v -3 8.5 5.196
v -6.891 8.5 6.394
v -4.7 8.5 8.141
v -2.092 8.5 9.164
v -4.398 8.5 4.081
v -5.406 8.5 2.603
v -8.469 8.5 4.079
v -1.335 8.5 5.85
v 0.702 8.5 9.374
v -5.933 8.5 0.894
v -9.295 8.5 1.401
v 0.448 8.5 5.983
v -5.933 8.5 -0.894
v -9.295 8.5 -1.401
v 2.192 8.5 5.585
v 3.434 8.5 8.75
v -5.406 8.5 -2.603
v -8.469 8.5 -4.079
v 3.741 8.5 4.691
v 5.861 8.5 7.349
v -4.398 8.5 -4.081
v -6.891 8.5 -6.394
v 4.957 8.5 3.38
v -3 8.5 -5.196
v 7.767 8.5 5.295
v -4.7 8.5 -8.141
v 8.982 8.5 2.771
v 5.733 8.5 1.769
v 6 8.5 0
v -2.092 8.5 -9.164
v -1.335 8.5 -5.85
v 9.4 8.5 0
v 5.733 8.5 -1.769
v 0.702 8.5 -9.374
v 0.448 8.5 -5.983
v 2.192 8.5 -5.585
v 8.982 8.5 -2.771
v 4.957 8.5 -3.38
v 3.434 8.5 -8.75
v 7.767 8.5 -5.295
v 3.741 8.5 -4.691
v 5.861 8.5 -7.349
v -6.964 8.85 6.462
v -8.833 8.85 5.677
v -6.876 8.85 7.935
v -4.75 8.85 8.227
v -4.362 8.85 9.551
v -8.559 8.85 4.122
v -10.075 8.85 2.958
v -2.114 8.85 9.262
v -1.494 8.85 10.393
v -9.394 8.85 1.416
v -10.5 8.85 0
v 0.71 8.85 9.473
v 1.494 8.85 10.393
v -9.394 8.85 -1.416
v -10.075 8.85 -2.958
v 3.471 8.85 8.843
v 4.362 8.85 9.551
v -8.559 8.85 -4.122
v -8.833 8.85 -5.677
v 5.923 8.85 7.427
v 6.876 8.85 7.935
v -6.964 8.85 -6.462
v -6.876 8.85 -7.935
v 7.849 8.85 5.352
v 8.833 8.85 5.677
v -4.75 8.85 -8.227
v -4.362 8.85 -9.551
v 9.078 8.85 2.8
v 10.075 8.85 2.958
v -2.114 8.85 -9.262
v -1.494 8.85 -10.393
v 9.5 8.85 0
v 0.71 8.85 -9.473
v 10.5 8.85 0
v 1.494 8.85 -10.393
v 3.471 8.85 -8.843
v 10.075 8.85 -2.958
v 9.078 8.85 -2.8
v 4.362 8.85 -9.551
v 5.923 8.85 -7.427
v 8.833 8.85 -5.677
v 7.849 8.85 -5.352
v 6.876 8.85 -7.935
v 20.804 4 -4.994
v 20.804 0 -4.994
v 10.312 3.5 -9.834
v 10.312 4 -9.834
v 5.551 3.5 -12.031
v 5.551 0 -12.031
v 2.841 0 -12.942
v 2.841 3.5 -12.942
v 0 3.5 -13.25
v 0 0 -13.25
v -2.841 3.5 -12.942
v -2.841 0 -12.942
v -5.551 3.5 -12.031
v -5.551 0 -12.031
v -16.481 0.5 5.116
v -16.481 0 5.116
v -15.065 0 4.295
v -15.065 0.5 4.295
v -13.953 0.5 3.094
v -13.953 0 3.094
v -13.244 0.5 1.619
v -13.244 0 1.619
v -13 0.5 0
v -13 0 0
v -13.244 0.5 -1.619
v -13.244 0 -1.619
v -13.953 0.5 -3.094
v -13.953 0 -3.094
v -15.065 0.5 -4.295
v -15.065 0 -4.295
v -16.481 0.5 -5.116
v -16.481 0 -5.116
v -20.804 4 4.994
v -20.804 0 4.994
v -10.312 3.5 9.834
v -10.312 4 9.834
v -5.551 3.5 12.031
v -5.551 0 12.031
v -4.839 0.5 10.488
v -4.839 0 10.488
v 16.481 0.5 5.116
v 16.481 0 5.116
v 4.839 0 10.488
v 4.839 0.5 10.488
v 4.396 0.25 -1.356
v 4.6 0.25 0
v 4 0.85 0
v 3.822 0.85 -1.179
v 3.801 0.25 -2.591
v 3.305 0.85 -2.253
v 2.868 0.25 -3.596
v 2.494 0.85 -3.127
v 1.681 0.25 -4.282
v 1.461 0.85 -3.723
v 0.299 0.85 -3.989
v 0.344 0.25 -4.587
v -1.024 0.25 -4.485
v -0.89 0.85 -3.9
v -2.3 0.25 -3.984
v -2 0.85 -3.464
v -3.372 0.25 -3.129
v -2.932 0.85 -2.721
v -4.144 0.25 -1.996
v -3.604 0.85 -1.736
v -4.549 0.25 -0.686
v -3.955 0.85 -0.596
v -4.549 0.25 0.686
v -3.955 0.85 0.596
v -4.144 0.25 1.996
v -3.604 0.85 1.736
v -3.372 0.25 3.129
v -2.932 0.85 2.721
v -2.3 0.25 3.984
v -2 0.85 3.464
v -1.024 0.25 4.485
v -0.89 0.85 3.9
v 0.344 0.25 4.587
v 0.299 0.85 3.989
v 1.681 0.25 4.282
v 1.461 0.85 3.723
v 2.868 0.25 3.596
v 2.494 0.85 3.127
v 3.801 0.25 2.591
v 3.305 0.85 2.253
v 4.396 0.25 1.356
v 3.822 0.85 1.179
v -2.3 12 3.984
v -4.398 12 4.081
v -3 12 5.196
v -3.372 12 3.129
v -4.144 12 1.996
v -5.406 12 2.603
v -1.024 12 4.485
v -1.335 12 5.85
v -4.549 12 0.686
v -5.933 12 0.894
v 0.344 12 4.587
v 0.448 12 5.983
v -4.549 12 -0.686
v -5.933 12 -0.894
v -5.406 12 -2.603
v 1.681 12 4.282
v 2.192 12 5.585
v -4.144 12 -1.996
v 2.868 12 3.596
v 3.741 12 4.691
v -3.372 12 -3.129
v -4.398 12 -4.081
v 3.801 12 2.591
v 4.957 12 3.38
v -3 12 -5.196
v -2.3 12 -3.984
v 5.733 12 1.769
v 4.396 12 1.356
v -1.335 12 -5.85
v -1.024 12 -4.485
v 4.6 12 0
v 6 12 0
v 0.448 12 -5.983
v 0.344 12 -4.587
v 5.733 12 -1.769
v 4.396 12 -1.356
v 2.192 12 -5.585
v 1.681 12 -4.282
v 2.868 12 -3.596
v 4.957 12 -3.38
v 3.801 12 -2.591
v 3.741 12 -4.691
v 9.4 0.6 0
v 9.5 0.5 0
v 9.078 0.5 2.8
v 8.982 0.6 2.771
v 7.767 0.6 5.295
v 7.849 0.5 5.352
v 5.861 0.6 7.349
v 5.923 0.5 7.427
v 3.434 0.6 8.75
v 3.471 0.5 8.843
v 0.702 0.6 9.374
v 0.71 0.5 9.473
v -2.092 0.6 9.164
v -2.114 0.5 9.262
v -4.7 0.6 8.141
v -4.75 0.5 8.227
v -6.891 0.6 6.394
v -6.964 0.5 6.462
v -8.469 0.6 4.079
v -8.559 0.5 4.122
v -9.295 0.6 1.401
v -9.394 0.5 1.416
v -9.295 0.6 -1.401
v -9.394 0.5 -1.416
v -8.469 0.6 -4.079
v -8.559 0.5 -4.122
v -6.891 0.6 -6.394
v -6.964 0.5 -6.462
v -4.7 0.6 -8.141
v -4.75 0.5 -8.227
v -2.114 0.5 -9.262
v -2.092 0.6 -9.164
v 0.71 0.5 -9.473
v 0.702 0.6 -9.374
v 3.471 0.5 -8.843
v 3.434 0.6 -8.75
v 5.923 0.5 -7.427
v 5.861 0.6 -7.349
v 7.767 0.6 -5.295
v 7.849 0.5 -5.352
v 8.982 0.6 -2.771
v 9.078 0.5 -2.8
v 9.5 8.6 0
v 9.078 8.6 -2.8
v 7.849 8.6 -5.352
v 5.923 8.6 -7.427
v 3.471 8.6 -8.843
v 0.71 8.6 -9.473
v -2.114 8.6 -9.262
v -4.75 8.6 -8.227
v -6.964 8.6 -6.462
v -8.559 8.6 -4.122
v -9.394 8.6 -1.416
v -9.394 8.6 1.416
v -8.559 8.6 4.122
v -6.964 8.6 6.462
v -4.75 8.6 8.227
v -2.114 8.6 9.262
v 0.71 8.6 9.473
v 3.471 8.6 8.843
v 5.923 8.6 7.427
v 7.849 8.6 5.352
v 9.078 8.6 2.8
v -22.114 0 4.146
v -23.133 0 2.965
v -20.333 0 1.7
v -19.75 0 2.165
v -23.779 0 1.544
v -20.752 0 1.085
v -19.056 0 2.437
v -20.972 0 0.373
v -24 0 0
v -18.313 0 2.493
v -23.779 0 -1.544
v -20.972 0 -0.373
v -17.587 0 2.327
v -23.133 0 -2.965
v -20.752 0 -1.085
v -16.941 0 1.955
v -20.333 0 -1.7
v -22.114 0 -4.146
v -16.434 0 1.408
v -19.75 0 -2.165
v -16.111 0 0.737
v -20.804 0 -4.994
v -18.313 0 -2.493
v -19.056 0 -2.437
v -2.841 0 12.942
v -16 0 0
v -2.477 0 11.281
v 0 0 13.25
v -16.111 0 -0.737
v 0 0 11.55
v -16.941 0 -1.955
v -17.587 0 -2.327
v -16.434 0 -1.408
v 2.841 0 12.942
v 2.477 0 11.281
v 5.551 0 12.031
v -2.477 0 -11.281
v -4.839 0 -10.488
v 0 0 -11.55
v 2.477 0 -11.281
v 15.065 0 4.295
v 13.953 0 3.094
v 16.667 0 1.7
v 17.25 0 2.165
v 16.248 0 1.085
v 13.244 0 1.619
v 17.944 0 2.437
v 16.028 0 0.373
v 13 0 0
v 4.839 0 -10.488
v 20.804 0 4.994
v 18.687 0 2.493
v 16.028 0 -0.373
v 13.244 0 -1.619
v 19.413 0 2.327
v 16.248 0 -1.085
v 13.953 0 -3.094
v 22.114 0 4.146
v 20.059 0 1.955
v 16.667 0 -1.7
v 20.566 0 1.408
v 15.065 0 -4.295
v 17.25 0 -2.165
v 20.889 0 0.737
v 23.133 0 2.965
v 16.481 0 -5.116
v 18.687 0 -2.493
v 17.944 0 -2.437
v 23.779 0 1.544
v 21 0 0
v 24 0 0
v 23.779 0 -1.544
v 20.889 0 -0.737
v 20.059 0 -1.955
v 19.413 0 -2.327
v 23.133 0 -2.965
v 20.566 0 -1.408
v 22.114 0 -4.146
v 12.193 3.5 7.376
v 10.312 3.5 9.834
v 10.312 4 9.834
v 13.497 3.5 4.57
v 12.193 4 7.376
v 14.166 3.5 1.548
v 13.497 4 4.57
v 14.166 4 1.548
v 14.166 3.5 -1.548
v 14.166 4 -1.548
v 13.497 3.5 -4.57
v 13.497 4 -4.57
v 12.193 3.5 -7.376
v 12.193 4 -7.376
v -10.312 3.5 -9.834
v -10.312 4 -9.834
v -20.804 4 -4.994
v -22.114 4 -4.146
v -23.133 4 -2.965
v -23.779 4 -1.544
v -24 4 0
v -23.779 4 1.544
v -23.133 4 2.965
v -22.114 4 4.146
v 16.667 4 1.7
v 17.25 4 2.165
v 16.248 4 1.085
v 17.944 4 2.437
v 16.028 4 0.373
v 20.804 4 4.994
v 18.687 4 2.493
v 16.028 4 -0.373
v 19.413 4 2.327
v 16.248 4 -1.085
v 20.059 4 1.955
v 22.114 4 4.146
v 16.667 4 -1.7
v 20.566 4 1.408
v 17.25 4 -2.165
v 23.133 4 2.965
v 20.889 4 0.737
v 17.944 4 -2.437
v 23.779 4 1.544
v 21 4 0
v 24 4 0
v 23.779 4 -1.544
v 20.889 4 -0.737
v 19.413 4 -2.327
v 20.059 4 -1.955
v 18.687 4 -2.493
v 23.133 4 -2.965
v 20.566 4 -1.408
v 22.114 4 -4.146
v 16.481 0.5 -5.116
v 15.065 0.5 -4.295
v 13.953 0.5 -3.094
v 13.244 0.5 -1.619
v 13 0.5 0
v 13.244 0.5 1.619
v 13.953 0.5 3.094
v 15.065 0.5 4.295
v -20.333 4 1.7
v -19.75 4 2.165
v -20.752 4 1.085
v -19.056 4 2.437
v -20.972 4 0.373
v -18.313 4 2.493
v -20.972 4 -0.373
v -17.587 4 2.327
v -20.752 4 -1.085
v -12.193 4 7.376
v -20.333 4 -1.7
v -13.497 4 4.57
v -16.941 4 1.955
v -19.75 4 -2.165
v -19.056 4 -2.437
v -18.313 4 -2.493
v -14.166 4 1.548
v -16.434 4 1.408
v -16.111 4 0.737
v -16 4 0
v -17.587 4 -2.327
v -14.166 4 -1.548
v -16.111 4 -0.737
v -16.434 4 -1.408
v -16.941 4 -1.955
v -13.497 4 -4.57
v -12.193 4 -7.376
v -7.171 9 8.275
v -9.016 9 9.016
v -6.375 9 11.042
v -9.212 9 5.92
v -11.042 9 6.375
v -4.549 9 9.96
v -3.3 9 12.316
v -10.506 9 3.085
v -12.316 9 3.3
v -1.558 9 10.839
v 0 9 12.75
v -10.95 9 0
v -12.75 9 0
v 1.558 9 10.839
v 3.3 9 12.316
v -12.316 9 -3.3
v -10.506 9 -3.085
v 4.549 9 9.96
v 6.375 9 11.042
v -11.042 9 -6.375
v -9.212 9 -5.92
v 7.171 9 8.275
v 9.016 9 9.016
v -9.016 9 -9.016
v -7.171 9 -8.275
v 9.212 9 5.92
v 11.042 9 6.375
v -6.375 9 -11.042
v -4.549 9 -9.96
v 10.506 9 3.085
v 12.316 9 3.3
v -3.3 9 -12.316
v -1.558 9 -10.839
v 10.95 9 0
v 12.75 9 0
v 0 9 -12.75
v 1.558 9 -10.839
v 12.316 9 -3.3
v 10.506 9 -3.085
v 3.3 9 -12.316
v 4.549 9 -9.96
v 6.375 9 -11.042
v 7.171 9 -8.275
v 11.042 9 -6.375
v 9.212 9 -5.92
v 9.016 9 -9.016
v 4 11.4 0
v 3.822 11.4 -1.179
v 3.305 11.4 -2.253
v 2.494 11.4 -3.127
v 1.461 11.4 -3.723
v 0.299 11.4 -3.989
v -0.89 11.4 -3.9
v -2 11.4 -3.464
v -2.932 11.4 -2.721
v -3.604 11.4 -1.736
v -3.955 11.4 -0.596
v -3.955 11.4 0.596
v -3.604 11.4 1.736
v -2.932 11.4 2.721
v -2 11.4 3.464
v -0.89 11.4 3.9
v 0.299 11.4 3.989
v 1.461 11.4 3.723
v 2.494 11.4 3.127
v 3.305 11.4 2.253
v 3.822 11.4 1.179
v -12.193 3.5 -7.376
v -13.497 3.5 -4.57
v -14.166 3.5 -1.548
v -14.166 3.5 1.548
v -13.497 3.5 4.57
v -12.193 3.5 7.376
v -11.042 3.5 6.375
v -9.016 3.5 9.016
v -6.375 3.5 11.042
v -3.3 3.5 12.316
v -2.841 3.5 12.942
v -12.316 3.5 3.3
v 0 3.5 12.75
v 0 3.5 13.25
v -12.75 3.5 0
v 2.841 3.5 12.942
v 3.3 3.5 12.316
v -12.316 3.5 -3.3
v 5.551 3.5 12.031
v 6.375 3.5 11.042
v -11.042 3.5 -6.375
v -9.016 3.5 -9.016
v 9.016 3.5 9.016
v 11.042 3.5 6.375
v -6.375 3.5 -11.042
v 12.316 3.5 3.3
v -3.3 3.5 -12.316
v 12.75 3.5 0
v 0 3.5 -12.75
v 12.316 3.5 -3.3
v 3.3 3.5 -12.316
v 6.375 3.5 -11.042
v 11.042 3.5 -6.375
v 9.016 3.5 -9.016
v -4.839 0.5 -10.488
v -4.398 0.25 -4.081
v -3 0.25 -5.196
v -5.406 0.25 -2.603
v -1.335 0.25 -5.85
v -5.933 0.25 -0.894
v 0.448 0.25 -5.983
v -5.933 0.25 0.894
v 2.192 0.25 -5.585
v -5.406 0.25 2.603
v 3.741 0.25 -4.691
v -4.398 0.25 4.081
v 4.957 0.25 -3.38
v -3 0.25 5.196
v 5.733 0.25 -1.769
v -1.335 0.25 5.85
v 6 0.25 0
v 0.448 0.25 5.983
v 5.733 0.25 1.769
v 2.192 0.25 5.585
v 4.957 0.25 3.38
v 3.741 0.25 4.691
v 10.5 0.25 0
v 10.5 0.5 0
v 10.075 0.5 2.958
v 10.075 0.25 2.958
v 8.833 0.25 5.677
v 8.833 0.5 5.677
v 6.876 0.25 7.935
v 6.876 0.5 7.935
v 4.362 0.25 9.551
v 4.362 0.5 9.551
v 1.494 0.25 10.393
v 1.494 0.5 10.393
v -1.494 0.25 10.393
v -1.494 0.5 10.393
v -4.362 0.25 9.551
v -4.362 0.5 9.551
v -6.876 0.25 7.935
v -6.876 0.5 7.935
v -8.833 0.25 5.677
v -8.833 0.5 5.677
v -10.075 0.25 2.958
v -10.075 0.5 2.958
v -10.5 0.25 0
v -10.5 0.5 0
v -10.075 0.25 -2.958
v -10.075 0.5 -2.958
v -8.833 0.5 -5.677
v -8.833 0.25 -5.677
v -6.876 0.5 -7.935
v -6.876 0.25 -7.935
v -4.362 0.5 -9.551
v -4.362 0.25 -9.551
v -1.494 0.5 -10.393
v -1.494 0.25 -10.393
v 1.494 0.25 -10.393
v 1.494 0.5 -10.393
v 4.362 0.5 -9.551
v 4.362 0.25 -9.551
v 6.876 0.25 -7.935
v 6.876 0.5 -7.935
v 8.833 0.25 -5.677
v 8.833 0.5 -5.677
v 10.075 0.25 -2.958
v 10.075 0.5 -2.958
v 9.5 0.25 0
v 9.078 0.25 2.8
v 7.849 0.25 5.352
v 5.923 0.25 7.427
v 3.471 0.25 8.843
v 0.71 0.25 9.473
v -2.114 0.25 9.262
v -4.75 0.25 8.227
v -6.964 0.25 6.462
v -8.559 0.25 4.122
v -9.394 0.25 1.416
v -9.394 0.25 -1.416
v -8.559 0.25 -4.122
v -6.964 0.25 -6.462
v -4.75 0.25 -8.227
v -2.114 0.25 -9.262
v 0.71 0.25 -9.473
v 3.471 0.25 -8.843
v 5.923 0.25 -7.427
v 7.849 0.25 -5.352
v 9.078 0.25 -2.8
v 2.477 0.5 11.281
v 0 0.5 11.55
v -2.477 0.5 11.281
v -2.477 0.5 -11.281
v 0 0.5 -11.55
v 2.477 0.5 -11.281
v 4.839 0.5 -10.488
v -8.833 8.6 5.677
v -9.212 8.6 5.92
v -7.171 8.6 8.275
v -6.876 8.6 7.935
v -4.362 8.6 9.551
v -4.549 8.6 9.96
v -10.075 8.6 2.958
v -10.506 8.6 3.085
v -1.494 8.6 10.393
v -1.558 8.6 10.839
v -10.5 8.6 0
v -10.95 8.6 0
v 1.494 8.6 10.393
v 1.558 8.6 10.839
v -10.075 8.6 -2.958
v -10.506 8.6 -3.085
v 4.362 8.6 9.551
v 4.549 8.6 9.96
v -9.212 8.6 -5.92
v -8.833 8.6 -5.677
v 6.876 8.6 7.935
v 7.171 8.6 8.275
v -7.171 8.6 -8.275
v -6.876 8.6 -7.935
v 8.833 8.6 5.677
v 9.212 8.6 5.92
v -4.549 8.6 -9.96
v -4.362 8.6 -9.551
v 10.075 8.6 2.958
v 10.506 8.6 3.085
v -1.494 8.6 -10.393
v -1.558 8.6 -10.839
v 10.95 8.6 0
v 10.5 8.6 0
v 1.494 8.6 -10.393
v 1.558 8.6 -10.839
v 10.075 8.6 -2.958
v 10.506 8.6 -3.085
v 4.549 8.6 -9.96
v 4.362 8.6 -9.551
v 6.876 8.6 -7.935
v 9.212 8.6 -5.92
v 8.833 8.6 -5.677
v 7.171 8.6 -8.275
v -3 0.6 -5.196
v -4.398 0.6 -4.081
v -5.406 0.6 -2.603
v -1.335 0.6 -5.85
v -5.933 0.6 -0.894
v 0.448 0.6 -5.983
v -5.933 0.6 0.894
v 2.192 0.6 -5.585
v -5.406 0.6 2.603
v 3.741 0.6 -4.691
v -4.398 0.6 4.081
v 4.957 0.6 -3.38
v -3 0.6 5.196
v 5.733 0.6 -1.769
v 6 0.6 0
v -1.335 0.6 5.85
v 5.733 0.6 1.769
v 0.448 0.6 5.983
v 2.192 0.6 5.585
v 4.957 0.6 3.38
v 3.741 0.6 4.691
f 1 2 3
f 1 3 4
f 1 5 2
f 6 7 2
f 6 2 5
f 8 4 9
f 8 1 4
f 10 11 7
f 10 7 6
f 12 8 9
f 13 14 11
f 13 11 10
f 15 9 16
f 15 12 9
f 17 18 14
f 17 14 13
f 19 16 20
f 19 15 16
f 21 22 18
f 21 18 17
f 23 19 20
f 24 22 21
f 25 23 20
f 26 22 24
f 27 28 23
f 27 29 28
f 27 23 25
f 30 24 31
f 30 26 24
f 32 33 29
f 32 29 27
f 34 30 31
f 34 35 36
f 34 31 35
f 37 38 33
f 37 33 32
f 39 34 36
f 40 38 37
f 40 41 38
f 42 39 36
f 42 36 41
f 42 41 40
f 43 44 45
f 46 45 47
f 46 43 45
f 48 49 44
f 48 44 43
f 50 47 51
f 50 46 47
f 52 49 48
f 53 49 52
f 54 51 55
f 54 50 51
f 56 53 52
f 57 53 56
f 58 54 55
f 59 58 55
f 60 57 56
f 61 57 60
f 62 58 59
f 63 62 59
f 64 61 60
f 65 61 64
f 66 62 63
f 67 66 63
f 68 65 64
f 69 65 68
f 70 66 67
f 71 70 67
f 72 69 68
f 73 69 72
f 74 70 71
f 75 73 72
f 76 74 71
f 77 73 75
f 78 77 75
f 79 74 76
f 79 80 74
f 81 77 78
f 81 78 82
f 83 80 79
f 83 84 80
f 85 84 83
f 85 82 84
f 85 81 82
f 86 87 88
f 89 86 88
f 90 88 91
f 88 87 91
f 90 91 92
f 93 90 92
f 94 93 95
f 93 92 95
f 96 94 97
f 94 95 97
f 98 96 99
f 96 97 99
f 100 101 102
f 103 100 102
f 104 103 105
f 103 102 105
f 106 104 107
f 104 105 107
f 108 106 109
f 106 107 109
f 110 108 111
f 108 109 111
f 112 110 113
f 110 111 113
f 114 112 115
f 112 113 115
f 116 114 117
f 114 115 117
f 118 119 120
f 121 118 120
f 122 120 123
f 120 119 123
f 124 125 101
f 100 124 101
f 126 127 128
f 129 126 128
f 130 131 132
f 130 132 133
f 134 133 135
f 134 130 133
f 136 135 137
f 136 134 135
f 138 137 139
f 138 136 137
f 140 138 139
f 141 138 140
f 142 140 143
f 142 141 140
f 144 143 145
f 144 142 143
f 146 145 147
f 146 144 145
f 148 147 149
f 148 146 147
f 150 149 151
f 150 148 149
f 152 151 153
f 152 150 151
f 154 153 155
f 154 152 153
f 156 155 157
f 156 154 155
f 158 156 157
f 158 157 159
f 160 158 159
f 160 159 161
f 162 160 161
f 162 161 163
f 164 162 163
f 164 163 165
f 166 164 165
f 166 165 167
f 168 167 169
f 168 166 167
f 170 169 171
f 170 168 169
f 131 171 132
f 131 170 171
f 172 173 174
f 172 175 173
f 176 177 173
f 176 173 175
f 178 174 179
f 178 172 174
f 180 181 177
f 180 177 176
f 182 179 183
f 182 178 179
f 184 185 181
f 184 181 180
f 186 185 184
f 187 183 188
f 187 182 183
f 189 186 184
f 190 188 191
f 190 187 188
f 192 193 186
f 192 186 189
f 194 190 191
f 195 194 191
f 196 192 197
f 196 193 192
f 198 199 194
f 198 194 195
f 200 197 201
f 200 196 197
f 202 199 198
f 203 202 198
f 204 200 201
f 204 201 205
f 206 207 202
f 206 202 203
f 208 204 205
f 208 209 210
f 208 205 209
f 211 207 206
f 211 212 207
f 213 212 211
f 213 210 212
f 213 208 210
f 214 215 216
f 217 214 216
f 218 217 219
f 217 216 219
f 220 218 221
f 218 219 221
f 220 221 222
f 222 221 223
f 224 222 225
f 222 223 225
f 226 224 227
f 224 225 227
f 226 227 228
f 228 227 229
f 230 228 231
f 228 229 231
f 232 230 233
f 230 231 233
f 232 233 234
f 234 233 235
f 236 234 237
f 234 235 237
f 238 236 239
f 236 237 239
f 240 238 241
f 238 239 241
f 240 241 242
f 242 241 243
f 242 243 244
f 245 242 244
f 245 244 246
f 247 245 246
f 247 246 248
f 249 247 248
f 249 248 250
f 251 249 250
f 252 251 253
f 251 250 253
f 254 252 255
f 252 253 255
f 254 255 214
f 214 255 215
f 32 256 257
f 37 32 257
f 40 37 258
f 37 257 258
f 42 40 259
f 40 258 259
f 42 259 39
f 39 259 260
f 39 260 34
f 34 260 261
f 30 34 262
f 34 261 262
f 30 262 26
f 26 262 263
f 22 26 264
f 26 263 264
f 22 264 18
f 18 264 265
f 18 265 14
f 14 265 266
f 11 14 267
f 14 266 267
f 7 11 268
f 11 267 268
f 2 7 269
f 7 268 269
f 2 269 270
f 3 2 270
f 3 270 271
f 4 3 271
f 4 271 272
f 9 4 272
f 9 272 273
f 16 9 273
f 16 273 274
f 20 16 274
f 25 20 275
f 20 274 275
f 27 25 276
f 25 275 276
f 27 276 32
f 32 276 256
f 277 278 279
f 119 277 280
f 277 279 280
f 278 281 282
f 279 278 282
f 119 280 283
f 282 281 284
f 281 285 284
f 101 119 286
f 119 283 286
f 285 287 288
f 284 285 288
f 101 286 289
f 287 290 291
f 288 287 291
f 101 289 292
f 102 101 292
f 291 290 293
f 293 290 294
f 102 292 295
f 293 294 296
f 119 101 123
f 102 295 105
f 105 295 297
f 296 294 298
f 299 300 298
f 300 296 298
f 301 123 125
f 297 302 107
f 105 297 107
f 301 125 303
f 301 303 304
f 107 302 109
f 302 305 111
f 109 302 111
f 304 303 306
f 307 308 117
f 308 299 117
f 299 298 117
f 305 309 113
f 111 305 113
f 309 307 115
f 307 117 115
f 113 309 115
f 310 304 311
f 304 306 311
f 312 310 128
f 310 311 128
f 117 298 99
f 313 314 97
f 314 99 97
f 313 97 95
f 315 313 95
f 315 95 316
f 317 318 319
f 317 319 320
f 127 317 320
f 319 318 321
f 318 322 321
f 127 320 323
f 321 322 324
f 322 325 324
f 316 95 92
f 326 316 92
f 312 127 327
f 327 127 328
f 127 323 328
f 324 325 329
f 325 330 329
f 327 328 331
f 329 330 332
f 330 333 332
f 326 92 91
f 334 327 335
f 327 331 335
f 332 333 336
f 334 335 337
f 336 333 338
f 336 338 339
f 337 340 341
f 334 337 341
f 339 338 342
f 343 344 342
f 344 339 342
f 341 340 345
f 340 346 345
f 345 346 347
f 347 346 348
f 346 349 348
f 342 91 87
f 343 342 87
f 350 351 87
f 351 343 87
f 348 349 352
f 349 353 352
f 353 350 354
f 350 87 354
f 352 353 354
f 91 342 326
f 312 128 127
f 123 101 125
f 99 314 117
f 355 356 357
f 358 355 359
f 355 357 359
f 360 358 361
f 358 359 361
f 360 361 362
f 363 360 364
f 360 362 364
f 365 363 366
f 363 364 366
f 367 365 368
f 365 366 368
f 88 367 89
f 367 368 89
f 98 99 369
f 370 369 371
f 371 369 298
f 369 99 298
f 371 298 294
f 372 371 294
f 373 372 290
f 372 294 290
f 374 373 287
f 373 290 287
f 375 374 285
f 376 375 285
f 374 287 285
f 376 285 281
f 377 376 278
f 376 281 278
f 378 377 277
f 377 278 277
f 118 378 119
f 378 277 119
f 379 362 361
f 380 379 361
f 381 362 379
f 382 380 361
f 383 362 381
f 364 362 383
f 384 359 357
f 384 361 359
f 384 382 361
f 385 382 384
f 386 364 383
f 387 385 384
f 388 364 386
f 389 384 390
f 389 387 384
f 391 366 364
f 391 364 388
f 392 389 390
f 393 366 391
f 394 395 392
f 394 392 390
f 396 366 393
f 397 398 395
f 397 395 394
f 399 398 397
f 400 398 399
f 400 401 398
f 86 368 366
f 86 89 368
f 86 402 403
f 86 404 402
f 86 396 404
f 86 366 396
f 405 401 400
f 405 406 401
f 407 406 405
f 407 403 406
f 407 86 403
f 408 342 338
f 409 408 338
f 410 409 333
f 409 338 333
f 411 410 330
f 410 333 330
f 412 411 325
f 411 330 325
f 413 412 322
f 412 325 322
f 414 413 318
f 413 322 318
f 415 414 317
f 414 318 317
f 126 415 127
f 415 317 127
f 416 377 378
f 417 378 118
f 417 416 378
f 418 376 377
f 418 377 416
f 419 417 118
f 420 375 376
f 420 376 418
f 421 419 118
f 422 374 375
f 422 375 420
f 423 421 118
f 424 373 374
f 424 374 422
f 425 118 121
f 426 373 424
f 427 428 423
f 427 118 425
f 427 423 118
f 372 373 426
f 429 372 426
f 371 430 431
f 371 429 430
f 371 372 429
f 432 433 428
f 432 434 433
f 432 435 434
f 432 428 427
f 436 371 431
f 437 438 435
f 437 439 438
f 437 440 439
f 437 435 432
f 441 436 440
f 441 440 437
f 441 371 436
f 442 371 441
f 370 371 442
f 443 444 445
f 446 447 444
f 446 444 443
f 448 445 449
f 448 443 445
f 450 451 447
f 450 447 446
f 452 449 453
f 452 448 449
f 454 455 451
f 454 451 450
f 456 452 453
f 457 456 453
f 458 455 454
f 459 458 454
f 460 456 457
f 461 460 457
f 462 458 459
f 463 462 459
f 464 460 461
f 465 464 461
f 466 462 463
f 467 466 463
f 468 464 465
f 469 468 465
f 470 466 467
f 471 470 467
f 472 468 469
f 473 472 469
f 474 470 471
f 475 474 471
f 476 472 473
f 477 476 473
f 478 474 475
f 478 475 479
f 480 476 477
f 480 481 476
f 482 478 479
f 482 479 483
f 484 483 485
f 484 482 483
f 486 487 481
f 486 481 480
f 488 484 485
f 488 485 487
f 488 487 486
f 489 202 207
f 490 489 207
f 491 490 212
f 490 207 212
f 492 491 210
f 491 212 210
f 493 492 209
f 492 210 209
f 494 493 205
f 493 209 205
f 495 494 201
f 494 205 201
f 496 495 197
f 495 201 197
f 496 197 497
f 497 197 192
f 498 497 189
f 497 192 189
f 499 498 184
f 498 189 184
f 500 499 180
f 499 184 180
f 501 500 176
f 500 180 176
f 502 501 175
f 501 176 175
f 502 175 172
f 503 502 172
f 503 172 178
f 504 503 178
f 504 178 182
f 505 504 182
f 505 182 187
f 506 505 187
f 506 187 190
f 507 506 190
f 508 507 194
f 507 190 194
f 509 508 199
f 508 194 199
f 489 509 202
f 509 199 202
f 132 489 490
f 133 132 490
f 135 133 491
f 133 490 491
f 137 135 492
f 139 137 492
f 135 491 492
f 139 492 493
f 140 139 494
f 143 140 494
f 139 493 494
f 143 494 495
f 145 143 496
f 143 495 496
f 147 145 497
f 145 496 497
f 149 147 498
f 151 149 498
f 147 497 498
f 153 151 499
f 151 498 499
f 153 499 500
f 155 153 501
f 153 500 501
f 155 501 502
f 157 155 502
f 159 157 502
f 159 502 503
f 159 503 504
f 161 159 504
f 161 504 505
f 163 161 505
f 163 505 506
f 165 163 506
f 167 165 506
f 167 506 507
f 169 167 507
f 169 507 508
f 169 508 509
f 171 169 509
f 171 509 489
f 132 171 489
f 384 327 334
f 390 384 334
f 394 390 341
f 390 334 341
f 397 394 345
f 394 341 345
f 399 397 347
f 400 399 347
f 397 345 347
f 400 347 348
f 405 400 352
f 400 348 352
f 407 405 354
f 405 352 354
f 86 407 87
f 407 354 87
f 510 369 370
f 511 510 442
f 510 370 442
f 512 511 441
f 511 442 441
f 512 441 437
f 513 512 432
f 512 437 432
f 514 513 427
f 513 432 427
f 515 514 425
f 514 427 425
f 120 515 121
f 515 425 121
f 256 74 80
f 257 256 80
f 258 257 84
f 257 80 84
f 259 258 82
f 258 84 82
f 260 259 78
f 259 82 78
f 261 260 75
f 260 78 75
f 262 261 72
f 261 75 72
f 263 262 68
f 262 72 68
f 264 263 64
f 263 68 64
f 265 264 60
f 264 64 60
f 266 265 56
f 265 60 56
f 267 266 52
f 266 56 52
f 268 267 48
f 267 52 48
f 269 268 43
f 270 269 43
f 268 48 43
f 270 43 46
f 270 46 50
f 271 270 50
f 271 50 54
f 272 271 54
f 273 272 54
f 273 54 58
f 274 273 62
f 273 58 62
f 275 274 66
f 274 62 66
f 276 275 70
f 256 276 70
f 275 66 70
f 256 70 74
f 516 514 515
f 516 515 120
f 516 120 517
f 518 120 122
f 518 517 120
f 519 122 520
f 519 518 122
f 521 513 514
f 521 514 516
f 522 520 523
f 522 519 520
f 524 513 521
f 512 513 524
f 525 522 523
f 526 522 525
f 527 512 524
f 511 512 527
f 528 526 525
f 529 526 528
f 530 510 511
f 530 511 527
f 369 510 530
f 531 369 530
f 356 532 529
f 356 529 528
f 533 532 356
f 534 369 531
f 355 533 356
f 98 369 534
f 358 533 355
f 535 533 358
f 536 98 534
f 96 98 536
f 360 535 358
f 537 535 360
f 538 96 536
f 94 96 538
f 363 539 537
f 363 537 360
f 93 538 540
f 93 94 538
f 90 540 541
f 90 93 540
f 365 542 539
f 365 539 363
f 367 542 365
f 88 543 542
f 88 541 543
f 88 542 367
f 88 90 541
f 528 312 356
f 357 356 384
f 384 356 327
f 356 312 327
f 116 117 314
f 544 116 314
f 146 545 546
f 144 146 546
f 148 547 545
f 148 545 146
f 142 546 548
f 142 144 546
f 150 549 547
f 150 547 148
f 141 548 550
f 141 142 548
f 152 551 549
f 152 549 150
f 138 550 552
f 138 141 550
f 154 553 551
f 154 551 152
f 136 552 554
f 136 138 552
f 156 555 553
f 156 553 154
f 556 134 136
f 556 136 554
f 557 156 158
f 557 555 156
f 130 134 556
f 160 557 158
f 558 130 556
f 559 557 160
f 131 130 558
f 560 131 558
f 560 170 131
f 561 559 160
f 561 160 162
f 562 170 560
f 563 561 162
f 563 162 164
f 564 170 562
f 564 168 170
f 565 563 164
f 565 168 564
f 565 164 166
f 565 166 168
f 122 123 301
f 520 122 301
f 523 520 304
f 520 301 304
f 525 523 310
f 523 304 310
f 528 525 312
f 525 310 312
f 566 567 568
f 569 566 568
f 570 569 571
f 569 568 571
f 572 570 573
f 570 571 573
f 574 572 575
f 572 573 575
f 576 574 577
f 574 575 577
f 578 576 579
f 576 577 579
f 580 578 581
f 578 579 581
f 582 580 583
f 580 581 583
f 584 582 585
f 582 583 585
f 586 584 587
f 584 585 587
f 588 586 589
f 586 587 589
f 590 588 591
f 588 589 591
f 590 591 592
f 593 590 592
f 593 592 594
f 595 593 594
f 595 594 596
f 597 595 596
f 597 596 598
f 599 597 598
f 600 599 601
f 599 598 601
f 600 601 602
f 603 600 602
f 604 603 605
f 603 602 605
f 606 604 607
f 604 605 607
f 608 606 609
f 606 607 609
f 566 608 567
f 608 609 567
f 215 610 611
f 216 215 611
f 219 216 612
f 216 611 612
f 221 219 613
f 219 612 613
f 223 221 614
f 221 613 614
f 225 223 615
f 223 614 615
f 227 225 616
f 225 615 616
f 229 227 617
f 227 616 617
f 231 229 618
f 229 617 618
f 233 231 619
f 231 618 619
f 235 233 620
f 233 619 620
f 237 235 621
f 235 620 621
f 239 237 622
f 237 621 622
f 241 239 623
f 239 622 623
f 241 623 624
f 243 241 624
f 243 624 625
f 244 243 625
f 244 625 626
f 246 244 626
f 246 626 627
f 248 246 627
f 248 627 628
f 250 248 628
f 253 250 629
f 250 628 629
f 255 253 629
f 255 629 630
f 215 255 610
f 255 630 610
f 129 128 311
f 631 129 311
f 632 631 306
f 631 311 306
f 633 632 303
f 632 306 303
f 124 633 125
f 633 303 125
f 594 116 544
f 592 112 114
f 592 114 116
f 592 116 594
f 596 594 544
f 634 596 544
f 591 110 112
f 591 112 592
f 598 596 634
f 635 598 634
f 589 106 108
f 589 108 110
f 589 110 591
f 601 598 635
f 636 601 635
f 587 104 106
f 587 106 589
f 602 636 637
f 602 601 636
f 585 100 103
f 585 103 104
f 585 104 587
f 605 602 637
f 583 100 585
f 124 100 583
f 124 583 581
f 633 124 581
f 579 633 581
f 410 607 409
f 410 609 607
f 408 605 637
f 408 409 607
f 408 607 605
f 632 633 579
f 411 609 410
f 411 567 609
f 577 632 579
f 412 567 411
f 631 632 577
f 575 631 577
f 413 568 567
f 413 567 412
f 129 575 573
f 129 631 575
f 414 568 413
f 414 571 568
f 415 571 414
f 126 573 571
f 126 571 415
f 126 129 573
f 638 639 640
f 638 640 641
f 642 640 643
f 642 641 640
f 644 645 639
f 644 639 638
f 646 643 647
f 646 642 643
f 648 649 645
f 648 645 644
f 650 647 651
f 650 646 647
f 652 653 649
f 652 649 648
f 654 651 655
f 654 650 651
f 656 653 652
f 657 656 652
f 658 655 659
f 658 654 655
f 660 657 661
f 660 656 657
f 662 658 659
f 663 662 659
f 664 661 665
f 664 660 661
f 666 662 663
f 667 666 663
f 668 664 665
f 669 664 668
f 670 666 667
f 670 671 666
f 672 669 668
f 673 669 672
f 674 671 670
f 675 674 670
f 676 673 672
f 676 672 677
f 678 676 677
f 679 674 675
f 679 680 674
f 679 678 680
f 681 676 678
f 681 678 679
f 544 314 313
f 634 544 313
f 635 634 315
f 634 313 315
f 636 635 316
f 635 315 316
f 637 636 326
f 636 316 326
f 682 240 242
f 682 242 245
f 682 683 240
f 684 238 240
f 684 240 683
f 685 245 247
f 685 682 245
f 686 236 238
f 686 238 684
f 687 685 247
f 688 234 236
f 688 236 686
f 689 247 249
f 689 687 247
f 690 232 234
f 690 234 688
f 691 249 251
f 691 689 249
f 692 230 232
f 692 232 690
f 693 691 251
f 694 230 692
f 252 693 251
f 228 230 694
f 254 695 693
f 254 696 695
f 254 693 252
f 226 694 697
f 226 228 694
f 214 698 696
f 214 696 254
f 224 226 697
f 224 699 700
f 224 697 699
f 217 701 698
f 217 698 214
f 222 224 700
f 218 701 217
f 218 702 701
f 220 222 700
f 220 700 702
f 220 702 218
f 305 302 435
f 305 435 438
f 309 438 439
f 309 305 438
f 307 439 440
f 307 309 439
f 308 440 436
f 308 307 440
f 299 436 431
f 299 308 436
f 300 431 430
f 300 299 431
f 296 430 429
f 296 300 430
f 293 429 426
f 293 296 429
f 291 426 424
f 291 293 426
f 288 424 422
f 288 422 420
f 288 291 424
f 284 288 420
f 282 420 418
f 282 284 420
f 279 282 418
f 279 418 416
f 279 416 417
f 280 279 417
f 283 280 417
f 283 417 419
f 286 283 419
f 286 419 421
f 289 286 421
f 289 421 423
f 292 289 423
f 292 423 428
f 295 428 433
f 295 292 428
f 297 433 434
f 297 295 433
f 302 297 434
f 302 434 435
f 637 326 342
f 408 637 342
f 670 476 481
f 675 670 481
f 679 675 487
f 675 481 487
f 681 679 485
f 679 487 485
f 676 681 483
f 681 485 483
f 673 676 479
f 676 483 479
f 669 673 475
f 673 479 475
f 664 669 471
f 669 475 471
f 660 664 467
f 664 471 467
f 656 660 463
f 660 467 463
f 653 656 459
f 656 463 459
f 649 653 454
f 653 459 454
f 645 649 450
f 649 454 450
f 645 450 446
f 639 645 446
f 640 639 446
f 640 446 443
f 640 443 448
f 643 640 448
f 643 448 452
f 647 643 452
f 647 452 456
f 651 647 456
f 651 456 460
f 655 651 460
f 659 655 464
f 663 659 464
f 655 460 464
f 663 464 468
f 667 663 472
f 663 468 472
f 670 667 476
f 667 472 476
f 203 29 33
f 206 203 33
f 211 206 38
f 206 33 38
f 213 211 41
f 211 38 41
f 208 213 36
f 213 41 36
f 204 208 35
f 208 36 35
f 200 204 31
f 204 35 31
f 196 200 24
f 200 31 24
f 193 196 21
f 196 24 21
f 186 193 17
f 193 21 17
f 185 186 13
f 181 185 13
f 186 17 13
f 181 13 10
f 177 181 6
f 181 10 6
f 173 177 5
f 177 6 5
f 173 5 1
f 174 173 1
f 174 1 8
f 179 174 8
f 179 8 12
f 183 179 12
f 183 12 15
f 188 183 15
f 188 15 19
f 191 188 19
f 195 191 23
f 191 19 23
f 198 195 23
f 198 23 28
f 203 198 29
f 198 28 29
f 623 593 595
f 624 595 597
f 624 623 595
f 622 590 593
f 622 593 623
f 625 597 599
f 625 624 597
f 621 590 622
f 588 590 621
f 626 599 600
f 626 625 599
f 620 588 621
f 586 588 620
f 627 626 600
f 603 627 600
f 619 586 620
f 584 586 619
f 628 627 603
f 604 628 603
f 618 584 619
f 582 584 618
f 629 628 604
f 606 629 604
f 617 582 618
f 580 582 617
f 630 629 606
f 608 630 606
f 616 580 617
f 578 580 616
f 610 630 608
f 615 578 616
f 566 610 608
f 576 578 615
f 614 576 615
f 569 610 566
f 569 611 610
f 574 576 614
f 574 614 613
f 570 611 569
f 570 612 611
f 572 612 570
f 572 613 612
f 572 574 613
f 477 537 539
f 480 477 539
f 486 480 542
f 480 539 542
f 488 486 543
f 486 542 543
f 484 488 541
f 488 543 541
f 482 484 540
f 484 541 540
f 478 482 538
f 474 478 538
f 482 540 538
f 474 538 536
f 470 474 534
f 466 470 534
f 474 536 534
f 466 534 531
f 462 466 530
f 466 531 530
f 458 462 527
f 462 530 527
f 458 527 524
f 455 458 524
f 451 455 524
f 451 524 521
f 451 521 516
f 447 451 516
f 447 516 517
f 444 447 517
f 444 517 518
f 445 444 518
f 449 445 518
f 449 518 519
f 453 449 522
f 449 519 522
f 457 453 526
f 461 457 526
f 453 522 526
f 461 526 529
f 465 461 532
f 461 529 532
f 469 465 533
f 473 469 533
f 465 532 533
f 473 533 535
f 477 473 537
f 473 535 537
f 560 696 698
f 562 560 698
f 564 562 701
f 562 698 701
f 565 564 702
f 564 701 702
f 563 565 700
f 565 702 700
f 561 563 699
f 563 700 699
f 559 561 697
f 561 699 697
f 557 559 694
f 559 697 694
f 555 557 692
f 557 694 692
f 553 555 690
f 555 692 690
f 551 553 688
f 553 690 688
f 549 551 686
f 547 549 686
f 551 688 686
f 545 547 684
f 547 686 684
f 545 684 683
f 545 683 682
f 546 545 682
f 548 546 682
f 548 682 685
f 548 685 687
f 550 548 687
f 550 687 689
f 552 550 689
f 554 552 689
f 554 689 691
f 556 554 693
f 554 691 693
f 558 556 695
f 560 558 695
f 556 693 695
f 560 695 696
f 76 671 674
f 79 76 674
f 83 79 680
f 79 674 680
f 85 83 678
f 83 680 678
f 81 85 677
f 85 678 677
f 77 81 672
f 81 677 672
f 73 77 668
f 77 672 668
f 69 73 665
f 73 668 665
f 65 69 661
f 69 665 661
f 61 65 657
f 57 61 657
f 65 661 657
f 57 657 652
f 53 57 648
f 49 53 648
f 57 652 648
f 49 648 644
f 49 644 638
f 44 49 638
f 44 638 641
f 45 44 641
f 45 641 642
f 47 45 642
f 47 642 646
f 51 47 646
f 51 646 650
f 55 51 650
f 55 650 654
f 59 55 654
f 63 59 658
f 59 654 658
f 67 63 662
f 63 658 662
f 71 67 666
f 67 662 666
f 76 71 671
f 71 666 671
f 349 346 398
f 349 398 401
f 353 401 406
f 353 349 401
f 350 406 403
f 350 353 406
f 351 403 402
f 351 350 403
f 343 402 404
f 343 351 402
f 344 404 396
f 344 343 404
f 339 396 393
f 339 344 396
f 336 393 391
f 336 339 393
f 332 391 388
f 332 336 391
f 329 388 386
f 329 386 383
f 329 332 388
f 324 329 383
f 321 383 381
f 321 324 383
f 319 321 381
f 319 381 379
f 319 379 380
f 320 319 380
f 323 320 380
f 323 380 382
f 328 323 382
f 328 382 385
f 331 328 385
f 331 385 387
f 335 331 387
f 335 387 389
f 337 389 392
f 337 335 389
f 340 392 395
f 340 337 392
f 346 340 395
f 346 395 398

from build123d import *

# Parameters (mm, degrees)
SKETCH2_R               = 2.5
BOSS_EXTRUDE1_DEPTH     = 4
SKETCH3_R               = 14.25
CUT_EXTRUDE1_DEPTH      = 0.5
SKETCH4_R               = 12.75
BOSS_EXTRUDE2_DEPTH     = 5.5
CUT_EXTRUDE2_DEPTH      = 0.5
SKETCH6_R               = 10.95
CUT_EXTRUDE3_DEPTH      = 0.4
SKETCH7_R               = 10.5
BOSS_EXTRUDE3_DEPTH     = 0.25
SKETCH8_R               = 9.5
CUT_EXTRUDE4_DEPTH      = 0.35
SKETCH9_R               = 10.5
BOSS_EXTRUDE4_DEPTH     = 0.25
SKETCH10_R              = 9.5
CUT_EXTRUDE5_DEPTH      = 0.35
SKETCH11_R              = 6
BOSS_EXTRUDE5_DEPTH     = 0.35
SKETCH12_R              = 6
BOSS_EXTRUDE6_DEPTH     = 3.5
SKETCH13_R              = 4
CUT_EXTRUDE6_DEPTH      = 1
CUT_EXTRUDE6_DEPTH_BACK = 13
CHAMFER1_SIZE           = 0.6
CHAMFER2_SIZE           = 0.6
CHAMFER3_SIZE           = 0.1


with BuildPart() as part:
    # Sketch2 → Boss-Extrude1 (new body)
    with BuildSketch(Plane(origin=(0, 0, 0), x_dir=(1, 0, 0), z_dir=(0, 1, 0))):
        with BuildLine():
            Line((-5.550675676, 12.031313293), (-20.804054054, 4.994130046))
            ThreePointArc((-20.804054054, 4.994130046), (-24, 0), (-20.804054054, -4.994130046))
            Line((-20.804054054, -4.994130046), (-5.550675676, -12.031313293))
            ThreePointArc((-5.550675676, -12.031313293), (0, -13.25), (5.550675676, -12.031313293))
            Line((5.550675676, -12.031313293), (20.804054054, -4.994130046))
            ThreePointArc((20.804054054, -4.994130046), (24, 0), (20.804054054, 4.994130046))
            Line((20.804054054, 4.994130046), (5.550675676, 12.031313293))
            ThreePointArc((5.550675676, 12.031313293), (0, 13.25), (-5.550675676, 12.031313293))
        make_face()
        with Locations((-18.5, 0)):
            Circle(SKETCH2_R, mode=Mode.SUBTRACT)
        with Locations((18.5, 0)):
            Circle(SKETCH2_R, mode=Mode.SUBTRACT)
    extrude(amount=BOSS_EXTRUDE1_DEPTH)

    # Sketch3 → Cut-Extrude1 (cut)
    with BuildSketch(Plane(origin=(0, 4, 0), x_dir=(1, 0, 0), z_dir=(0, 1, 0))):
        Circle(SKETCH3_R)
    extrude(amount=-CUT_EXTRUDE1_DEPTH, mode=Mode.SUBTRACT)

    # Sketch4 → Boss-Extrude2 (add)
    with BuildSketch(Plane(origin=(0, 3.5, 0), x_dir=(1, 0, 0), z_dir=(0, 1, 0))):
        Circle(SKETCH4_R)
    extrude(amount=BOSS_EXTRUDE2_DEPTH)

    # Sketch5 → Cut-Extrude2 (cut)
    with BuildSketch(Plane.XZ):
        with BuildLine():
            Line((4.838513514, -10.487673097), (16.48142728, -5.116186488))
            ThreePointArc((16.48142728, -5.116186488), (13, 0), (16.48142728, 5.116186488))
            Line((16.48142728, 5.116186488), (4.838513514, 10.487673097))
            ThreePointArc((4.838513514, 10.487673097), (0, 11.55), (-4.838513514, 10.487673097))
            Line((-4.838513514, 10.487673097), (-16.48142728, 5.116186488))
            ThreePointArc((-16.48142728, 5.116186488), (-13, 0), (-16.48142728, -5.116186488))
            Line((-16.48142728, -5.116186488), (-4.838513514, -10.487673097))
            ThreePointArc((-4.838513514, -10.487673097), (0, -11.55), (4.838513514, -10.487673097))
        make_face()
    extrude(amount=-CUT_EXTRUDE2_DEPTH, mode=Mode.SUBTRACT)

    # Sketch6 → Cut-Extrude3 (cut)
    with BuildSketch(Plane(origin=(0, 9, 0), x_dir=(1, 0, 0), z_dir=(0, 1, 0))):
        Circle(SKETCH6_R)
    extrude(amount=-CUT_EXTRUDE3_DEPTH, mode=Mode.SUBTRACT)

    # Sketch7 → Boss-Extrude3 (add)
    with BuildSketch(Plane(origin=(0, 8.6, 0), x_dir=(1, 0, 0), z_dir=(0, 1, 0))):
        Circle(SKETCH7_R)
    extrude(amount=BOSS_EXTRUDE3_DEPTH)

    # Sketch8 → Cut-Extrude4 (cut)
    with BuildSketch(Plane(origin=(0, 8.85, 0), x_dir=(1, 0, 0), z_dir=(0, 1, 0))):
        Circle(SKETCH8_R)
    extrude(amount=-CUT_EXTRUDE4_DEPTH, mode=Mode.SUBTRACT)

    # Sketch9 → Boss-Extrude4 (add)
    with BuildSketch(Plane.XZ.offset(-0.5)):
        Circle(SKETCH9_R)
    extrude(amount=BOSS_EXTRUDE4_DEPTH)

    # Sketch10 → Cut-Extrude5 (cut)
    with BuildSketch(Plane.XZ.offset(-0.25)):
        Circle(SKETCH10_R)
    extrude(amount=-CUT_EXTRUDE5_DEPTH, mode=Mode.SUBTRACT)

    # Sketch11 → Boss-Extrude5 (add)
    with BuildSketch(Plane.XZ.offset(-0.6)):
        Circle(SKETCH11_R)
    extrude(amount=BOSS_EXTRUDE5_DEPTH)

    # Sketch12 → Boss-Extrude6 (add)
    with BuildSketch(Plane(origin=(0, 8.5, 0), x_dir=(1, 0, 0), z_dir=(0, 1, 0))):
        Circle(SKETCH12_R)
    extrude(amount=BOSS_EXTRUDE6_DEPTH)

    # Sketch13 → Cut-Extrude6 (cut, two sides)
    with BuildSketch(Plane(origin=(0, 12, 0), x_dir=(1, 0, 0), z_dir=(0, 1, 0))) as cut_extrude6_sk:
        Circle(SKETCH13_R)
    extrude(amount=CUT_EXTRUDE6_DEPTH, mode=Mode.SUBTRACT)
    extrude(cut_extrude6_sk.sketch, amount=-CUT_EXTRUDE6_DEPTH_BACK, mode=Mode.SUBTRACT)

    # Chamfer1
    chamfer1_edges = [part.edges().sort_by_distance(p)[0] for p in [
        (-4, 12, 0),
    ]]
    chamfer(chamfer1_edges, length=CHAMFER1_SIZE)

    # Chamfer2
    chamfer2_edges = [part.edges().sort_by_distance(p)[0] for p in [
        (-4, 0.25, 0),
    ]]
    chamfer(chamfer2_edges, length=CHAMFER2_SIZE)

    # Chamfer3
    chamfer3_edges = [part.edges().sort_by_distance(p)[0] for p in [
        (-9.5, 0.6, 0),
        (-9.5, 8.5, 0),
    ]]
    chamfer(chamfer3_edges, length=CHAMFER3_SIZE)


solid = part.part
